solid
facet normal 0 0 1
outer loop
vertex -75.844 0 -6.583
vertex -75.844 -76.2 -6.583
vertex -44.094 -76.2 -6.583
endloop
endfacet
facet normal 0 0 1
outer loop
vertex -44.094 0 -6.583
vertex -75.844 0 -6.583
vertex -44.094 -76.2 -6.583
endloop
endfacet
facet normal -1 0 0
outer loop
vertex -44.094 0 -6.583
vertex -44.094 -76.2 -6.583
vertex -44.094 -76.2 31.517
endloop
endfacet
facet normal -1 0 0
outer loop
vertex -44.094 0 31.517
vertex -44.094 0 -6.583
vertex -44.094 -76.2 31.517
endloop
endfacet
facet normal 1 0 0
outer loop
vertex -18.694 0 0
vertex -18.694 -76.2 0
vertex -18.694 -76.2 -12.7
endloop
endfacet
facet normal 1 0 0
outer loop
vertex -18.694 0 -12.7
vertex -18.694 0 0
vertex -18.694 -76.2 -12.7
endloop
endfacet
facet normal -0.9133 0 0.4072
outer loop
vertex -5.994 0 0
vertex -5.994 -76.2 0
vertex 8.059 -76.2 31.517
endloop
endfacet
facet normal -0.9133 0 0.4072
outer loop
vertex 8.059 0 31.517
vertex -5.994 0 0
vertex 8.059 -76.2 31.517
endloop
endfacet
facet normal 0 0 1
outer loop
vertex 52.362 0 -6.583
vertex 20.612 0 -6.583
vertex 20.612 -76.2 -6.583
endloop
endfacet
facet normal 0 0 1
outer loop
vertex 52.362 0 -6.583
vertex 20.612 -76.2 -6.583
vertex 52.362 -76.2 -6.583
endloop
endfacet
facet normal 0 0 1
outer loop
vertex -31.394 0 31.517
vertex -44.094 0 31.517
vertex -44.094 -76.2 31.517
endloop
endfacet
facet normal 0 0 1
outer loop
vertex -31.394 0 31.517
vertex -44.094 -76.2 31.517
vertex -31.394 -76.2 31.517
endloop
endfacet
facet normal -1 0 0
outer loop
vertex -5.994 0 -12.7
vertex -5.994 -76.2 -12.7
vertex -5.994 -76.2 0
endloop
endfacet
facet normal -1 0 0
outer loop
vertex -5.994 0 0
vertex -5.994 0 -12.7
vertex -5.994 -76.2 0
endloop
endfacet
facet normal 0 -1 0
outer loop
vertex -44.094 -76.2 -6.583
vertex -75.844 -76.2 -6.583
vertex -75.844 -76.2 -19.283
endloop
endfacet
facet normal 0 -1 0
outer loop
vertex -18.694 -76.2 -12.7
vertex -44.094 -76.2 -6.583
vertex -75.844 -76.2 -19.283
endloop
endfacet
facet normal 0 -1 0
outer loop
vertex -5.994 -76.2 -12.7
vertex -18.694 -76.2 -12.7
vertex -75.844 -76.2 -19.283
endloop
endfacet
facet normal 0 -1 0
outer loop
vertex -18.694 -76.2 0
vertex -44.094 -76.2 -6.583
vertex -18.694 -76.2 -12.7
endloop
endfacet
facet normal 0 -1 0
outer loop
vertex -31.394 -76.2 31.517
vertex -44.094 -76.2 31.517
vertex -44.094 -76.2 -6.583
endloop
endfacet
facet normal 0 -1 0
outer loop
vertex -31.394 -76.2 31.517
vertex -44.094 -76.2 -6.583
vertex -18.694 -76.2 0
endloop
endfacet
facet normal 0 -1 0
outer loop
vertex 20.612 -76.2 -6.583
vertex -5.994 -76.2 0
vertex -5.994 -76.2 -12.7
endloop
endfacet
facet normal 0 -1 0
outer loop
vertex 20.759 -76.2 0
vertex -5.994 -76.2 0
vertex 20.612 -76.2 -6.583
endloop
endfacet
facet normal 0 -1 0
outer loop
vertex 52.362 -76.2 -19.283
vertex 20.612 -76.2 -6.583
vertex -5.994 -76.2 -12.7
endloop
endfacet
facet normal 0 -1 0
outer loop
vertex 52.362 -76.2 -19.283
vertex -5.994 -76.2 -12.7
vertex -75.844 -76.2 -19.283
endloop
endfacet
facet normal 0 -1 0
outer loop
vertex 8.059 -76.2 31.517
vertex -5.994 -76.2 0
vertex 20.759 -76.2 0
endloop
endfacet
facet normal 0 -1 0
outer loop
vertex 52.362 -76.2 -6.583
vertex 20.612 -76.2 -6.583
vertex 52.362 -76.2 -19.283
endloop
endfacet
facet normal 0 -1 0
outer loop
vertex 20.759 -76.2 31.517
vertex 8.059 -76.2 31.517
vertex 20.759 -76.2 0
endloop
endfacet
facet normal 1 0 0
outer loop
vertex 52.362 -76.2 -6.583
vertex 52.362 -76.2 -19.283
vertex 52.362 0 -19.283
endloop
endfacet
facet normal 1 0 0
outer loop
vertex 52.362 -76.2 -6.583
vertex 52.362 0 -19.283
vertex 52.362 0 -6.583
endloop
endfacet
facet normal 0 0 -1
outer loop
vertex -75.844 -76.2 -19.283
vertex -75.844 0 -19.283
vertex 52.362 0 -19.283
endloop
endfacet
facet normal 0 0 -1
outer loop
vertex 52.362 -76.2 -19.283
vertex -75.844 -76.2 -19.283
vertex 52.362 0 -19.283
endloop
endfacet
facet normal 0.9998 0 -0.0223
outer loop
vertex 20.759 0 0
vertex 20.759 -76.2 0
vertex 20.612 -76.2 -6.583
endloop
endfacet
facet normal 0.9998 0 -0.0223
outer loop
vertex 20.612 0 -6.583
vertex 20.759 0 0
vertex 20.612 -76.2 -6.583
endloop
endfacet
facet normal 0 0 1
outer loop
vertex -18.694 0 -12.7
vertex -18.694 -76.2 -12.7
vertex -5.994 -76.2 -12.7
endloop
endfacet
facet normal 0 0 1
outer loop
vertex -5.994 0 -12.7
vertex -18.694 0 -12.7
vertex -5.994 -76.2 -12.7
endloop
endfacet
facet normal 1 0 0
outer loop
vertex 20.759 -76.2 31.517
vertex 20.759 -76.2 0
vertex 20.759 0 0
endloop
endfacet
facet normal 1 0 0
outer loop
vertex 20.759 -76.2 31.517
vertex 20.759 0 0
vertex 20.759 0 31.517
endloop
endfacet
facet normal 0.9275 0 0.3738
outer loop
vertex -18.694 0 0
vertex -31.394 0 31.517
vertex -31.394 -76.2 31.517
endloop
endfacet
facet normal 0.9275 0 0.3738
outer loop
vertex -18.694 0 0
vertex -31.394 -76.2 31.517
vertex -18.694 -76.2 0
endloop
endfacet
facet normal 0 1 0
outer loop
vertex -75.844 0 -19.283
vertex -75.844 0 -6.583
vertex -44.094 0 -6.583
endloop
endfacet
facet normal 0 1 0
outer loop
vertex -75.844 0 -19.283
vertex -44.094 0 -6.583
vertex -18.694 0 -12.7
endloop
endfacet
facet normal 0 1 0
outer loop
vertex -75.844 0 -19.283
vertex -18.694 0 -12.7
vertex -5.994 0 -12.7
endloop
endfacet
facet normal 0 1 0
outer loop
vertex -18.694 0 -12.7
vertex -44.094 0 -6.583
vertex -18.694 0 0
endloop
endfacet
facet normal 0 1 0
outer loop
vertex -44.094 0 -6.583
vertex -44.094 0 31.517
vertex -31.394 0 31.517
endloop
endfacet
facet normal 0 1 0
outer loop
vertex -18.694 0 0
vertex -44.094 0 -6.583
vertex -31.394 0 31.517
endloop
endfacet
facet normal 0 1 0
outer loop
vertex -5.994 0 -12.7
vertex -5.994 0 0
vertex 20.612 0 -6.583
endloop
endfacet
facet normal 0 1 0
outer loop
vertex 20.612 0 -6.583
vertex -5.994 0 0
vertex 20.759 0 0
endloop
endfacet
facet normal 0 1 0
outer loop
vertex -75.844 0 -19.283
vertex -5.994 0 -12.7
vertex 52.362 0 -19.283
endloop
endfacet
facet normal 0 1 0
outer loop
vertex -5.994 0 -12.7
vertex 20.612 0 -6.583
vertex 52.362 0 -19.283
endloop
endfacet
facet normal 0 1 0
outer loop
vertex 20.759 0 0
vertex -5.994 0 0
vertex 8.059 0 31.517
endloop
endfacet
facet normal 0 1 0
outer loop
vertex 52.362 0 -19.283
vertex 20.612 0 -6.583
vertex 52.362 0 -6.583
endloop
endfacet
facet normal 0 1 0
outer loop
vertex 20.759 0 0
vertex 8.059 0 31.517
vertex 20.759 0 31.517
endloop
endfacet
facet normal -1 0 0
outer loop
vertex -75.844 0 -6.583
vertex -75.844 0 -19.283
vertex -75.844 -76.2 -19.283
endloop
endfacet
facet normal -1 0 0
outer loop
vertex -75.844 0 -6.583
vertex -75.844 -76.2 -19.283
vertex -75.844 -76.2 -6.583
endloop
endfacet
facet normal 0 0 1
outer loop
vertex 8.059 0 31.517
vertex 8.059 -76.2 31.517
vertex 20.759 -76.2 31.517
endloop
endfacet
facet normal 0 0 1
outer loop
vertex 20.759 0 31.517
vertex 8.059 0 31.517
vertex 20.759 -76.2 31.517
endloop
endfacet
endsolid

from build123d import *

# Parameters (mm, degrees)
F0_W      = 152.4
F0_H      = 50.8
F1_DEPTH  = 76.2
F2_W      = 31.75
F2_H      = 38.1
F3_DEPTH  = 76.201
F5_DEPTH  = 76.201
F6_W      = 55.7977713972
F6_H      = 31.5170145214
F7_DEPTH  = 76.201
F9_DEPTH  = 76.201
F10_W     = 24.1939584613
F10_H     = 12.7
F11_DEPTH = 76.201


with BuildPart() as f1:
    # F0 (on Front) → F1 (new body)
    with BuildSketch(Plane.XZ):
        with Locations((0.3563324094, 6.1170145214)):
            Rectangle(F0_W, F0_H)
    extrude(amount=F1_DEPTH)

    # F2 (on face) → F3 (cut, through all)
    with BuildSketch(Plane.XZ.offset(76.2)):
        with Locations((-59.9686675906, 12.4670145214)):
            Rectangle(F2_W, F2_H)
    extrude(amount=-F3_DEPTH, mode=Mode.SUBTRACT)

    # F4 (on face) → F5 (cut, through all)
    with BuildSketch(Plane.XZ.offset(76.2)):
        Polygon((8.0585610121, 31.5170145214), (-31.3936675906, 31.5170145214), (-18.6936675906, 0), (-18.6936675906, -12.7), (-5.9936675906, -12.7), (-5.9936675906, 0), align=None)
    extrude(amount=-F5_DEPTH, mode=Mode.SUBTRACT)

    # F6 (on face) → F7 (cut, through all)
    with BuildSketch(Plane.XZ.offset(76.2)):
        with Locations((48.6574467108, 15.7585072607)):
            Rectangle(F6_W, F6_H)
    extrude(amount=-F7_DEPTH, mode=Mode.SUBTRACT)

    # F8 (on face) → F9 (cut, through all)
    with BuildSketch(Plane.XZ.offset(76.2)):
        Polygon((20.7585610121, 0), (20.6123739481, -6.5829854786), (20.70865446, -6.5829854786), align=None)
        Polygon((76.5563324094, 0), (20.7585610121, 0), (20.70865446, -6.5829854786), (76.5563324094, -6.5829854786), align=None)
    extrude(amount=-F9_DEPTH, mode=Mode.SUBTRACT)

    # F10 (on face) → F11 (cut, through all)
    with BuildSketch(Plane.XZ.offset(76.2)):
        with Locations((64.4593531787, -12.9329854786)):
            Rectangle(F10_W, F10_H)
    extrude(amount=-F11_DEPTH, mode=Mode.SUBTRACT)


solid = f1.part
